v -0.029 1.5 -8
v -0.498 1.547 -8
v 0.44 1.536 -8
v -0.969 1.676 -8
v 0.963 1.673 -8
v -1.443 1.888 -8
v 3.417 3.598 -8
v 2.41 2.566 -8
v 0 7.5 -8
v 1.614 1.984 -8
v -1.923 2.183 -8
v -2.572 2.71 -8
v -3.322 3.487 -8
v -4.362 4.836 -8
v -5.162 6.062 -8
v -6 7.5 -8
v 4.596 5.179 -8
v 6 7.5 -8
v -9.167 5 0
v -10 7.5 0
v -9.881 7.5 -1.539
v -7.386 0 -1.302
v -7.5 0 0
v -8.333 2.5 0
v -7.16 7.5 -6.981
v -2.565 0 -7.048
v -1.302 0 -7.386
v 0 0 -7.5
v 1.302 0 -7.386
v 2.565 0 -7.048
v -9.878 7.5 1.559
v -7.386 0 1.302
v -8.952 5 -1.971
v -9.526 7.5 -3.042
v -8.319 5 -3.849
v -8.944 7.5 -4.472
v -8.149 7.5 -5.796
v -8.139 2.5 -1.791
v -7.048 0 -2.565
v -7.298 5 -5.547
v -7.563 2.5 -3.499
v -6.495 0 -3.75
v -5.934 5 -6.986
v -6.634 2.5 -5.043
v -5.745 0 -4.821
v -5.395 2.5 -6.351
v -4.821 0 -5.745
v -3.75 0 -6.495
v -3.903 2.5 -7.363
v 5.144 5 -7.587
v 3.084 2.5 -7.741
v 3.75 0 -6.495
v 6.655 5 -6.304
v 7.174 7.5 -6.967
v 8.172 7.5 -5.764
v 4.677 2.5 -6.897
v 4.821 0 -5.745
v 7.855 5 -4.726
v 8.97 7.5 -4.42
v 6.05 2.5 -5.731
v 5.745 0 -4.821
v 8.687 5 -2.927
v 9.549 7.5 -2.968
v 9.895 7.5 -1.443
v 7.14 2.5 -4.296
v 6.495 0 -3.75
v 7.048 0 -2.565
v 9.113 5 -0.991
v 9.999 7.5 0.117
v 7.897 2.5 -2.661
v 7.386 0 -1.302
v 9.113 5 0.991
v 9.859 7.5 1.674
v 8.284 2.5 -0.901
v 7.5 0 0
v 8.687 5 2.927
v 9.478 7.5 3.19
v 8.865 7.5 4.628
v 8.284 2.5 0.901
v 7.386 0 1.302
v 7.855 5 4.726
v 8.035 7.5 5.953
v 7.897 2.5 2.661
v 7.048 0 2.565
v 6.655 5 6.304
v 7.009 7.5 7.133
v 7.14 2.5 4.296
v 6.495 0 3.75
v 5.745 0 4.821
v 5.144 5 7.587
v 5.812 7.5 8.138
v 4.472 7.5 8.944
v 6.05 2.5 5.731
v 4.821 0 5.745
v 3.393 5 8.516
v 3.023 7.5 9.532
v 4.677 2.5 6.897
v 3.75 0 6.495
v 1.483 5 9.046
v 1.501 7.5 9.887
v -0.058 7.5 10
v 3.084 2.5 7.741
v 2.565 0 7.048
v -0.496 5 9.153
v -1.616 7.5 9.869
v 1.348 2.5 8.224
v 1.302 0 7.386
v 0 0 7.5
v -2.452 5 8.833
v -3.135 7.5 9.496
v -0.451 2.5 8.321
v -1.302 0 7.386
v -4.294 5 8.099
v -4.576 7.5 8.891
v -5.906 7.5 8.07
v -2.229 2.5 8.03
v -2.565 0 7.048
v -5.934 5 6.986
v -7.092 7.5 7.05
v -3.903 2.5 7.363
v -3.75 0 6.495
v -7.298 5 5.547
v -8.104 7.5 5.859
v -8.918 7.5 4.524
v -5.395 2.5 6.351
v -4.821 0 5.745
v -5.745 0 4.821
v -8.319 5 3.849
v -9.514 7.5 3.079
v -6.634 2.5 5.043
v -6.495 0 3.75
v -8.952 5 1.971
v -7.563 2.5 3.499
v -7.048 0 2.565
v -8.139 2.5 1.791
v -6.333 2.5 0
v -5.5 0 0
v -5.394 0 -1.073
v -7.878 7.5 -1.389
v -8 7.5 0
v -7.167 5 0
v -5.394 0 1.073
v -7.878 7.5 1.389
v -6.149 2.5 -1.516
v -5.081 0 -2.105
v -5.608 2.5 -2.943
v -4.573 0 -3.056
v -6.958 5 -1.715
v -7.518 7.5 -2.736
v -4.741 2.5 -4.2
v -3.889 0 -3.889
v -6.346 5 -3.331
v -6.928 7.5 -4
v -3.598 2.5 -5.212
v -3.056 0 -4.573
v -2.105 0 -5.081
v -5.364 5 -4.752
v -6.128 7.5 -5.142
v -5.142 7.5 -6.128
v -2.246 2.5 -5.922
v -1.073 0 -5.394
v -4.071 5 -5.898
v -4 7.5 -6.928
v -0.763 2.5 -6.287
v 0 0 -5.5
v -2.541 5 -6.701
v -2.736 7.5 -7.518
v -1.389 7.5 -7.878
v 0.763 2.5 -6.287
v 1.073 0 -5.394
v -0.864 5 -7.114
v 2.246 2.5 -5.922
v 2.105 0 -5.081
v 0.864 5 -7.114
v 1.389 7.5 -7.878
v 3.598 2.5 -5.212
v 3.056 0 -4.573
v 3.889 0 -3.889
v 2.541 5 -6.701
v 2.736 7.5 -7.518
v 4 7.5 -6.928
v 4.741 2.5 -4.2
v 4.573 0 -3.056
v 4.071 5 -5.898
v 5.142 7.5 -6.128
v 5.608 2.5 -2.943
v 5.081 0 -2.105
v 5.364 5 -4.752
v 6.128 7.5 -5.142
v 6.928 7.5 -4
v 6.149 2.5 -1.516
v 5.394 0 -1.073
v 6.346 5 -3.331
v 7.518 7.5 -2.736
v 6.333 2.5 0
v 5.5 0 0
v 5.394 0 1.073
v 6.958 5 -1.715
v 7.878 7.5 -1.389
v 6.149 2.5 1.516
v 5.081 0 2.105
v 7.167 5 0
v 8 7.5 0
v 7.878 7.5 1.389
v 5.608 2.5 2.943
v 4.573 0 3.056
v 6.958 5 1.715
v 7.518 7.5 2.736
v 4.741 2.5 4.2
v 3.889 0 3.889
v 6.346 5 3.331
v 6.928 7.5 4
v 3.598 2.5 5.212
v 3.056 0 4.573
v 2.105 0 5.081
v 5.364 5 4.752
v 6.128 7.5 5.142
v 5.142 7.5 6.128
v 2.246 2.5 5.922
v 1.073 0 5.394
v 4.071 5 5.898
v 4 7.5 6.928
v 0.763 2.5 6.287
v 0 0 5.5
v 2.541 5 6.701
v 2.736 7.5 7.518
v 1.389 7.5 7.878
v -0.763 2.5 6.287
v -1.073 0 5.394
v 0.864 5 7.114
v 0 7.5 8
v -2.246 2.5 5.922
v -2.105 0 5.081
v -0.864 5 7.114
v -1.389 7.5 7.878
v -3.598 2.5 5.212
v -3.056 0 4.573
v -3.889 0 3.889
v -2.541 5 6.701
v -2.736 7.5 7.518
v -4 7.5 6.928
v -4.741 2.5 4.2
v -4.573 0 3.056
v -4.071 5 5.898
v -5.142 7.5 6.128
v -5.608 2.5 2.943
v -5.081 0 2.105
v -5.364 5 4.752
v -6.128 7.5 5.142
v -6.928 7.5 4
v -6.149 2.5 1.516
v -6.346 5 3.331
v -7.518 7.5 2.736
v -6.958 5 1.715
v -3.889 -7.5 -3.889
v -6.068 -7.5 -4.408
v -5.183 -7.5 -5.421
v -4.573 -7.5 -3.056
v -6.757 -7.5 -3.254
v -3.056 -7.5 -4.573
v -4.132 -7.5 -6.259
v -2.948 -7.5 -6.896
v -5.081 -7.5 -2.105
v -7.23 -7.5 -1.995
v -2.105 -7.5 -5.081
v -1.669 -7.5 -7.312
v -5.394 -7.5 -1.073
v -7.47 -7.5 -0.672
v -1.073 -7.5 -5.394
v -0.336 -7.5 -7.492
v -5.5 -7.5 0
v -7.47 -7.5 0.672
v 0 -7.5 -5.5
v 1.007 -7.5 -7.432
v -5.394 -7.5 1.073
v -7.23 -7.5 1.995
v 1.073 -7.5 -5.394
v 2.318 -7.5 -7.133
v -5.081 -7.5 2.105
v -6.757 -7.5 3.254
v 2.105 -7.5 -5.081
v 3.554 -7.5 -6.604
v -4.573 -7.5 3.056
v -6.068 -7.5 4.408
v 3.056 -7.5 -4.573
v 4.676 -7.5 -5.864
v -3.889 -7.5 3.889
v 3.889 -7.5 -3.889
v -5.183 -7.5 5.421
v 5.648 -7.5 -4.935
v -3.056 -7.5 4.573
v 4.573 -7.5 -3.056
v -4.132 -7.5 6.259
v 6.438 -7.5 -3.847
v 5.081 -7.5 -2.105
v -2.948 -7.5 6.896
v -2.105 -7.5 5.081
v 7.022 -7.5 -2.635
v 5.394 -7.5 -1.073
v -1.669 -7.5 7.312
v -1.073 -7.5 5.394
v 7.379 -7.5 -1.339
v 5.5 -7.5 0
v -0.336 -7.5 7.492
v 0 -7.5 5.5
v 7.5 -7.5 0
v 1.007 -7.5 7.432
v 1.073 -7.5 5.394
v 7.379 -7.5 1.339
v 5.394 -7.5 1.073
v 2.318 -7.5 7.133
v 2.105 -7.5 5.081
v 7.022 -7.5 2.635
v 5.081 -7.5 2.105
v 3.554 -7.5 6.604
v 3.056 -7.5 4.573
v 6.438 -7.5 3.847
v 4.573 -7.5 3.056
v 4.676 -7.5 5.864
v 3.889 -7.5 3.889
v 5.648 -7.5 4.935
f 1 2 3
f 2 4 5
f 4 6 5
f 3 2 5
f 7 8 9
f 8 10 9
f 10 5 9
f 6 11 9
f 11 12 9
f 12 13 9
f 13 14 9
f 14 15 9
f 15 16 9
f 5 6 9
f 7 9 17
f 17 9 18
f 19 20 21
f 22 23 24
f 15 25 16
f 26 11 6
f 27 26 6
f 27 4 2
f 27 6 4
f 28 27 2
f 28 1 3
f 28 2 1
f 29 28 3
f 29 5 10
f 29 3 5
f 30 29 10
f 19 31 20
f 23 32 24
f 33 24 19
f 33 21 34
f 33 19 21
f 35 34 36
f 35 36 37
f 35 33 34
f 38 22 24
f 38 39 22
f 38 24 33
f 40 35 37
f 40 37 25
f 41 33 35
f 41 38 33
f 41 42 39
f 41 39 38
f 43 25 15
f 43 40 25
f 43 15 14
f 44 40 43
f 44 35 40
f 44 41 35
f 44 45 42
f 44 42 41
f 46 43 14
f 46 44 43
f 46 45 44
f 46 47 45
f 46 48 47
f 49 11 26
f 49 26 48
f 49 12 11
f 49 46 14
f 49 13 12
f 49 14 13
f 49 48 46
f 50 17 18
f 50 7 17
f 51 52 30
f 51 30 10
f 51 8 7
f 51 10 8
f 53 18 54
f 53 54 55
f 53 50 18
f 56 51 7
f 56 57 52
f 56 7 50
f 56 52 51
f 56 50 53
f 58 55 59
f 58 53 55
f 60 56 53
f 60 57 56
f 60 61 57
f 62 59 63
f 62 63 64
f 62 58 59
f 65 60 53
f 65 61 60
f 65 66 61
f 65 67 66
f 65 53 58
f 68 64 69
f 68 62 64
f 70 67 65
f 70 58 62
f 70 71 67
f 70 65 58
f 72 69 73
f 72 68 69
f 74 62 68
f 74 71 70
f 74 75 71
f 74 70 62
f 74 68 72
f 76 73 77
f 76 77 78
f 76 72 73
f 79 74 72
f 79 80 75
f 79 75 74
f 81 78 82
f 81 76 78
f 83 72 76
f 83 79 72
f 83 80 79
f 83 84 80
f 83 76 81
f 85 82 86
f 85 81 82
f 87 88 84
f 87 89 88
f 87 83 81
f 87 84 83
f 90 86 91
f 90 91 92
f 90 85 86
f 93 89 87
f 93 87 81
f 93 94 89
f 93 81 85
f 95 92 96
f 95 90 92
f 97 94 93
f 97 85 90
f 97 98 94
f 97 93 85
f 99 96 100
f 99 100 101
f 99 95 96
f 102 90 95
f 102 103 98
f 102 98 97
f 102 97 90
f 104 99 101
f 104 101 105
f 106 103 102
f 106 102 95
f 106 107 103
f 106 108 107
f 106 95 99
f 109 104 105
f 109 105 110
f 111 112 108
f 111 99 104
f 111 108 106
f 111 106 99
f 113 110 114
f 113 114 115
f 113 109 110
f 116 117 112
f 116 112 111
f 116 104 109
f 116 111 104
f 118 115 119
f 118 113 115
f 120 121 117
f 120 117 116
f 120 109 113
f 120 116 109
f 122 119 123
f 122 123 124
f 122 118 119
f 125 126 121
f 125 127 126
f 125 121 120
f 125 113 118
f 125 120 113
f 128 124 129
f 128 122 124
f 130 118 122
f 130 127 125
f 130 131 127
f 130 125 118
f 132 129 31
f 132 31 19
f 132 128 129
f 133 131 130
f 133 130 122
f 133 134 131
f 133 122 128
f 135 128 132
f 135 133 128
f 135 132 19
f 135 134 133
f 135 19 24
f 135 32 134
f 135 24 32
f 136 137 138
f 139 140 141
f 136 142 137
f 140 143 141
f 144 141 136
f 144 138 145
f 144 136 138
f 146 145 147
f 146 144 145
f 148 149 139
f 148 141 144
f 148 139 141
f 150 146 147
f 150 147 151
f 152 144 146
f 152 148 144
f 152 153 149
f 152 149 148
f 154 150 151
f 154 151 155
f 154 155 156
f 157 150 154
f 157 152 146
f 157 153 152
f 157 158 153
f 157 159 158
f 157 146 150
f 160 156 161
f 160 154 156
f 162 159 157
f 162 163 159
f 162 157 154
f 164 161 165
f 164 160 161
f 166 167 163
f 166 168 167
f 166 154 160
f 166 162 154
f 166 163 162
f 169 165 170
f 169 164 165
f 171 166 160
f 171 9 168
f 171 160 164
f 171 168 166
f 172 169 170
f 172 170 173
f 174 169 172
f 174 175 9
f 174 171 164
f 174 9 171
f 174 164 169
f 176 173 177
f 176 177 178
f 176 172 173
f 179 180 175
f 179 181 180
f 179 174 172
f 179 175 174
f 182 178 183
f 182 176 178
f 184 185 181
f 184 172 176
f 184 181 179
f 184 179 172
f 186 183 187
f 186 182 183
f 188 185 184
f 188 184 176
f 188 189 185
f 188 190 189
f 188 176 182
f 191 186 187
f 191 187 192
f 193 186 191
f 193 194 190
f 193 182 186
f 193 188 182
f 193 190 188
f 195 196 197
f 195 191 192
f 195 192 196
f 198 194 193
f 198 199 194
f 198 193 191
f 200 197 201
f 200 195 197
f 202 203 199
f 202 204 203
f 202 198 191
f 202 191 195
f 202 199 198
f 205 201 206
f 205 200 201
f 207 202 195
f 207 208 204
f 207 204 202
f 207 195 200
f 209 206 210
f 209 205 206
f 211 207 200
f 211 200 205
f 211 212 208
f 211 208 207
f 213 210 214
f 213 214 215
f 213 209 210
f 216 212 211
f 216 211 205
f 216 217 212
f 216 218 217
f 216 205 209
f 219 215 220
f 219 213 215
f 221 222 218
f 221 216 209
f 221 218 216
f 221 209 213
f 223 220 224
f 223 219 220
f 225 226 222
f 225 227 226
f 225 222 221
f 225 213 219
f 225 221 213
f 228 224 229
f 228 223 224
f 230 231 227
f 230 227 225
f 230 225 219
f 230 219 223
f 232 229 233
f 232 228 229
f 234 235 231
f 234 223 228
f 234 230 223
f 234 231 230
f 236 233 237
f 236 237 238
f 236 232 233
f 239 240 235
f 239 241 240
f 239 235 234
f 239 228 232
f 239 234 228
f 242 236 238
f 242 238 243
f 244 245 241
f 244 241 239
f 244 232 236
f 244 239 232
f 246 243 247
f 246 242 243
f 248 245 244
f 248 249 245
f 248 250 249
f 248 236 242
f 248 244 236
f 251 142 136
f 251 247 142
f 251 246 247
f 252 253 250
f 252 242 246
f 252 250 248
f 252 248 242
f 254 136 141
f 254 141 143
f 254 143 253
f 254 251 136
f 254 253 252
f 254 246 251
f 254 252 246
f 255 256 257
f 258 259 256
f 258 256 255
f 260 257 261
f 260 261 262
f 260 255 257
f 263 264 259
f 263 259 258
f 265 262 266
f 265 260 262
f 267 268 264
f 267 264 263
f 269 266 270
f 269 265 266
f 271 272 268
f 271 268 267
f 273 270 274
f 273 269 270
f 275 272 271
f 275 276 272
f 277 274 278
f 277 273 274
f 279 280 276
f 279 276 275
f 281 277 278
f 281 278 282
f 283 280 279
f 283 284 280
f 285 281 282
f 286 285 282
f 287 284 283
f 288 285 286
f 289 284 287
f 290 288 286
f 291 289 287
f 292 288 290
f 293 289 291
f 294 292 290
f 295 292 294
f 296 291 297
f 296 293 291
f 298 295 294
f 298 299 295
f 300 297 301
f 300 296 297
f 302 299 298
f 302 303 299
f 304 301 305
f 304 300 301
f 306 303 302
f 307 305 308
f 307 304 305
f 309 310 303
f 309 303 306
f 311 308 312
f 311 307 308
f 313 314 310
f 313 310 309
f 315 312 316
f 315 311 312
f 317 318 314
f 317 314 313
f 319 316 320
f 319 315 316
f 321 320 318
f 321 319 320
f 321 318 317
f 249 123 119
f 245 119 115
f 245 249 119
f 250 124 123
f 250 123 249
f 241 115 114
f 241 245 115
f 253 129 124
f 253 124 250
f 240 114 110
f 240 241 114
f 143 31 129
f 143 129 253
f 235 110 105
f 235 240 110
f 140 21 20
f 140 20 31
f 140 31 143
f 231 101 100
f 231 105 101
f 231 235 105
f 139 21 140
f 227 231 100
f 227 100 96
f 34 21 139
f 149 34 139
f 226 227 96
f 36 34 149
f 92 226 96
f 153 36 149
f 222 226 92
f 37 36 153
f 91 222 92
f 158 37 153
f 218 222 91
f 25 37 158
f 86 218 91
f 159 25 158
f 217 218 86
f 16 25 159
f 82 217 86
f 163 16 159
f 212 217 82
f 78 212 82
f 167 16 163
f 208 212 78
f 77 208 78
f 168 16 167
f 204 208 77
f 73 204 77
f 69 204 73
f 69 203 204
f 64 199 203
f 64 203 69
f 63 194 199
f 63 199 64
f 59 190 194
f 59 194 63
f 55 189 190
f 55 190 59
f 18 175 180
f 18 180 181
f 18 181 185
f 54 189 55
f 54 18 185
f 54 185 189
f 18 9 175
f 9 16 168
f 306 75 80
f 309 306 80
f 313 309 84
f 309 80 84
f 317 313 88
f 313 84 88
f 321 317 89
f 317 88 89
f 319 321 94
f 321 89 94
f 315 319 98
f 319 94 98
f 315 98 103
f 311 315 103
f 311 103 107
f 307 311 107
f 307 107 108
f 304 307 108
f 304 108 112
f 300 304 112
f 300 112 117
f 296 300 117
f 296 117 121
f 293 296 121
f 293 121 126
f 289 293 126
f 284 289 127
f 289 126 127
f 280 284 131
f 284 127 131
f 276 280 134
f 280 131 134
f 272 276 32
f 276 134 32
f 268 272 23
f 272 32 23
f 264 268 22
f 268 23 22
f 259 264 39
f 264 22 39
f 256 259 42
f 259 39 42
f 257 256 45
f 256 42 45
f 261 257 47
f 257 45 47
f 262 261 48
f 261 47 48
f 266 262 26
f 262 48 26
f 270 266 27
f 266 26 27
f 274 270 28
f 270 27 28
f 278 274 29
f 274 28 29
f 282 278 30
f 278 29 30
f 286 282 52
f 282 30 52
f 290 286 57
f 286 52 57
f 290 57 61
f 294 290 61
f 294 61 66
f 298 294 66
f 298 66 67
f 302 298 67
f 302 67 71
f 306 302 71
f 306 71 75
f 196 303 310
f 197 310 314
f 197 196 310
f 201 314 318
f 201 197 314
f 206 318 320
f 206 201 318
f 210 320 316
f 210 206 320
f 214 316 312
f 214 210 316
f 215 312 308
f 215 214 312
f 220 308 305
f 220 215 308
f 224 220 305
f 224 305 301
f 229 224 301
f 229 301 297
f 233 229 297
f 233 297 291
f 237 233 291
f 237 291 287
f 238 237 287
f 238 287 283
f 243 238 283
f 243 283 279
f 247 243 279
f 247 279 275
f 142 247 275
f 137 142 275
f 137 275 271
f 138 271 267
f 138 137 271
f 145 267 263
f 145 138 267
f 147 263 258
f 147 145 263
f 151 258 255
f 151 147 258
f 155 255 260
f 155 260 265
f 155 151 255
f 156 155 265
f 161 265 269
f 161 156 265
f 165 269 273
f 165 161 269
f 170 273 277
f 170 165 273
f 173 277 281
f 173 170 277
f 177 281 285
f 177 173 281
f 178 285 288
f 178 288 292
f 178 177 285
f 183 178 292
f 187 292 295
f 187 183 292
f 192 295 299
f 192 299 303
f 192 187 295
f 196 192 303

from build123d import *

# Parameters (mm, degrees)
CROQUIS3_R              = 7.5
CROQUIS3_R_2            = 5.5
SALIENTE_EXTRUIR1_DEPTH = 7.5
CROQUIS4_W              = 14.601596012
CROQUIS4_H              = 2.867230366
CORTAR_EXTRUIR1_DEPTH   = 19.5


with BuildPart() as part:
    # Croquis2 → Revolución1 (revolve)
    with BuildSketch(Plane.XY):
        Polygon((-5.5, 0), (-8, 7.5), (-10, 7.5), (-7.5, 0), align=None)
    revolve(axis=Axis((0, 7.5, 0), (0, -1, 0)))

    # Croquis3 → Saliente-Extruir1 (add)
    with BuildSketch(Plane.XZ):
        Circle(CROQUIS3_R)
        Circle(CROQUIS3_R_2, mode=Mode.SUBTRACT)
    extrude(amount=SALIENTE_EXTRUIR1_DEPTH)

    # Croquis4 → Cortar-Extruir1 (cut)
    with BuildSketch(Plane(origin=(0, 7.5, 0), x_dir=(1, 0, 0), z_dir=(0, 1, 0))):
        with Locations((0, 9.433615183)):
            Rectangle(CROQUIS4_W, CROQUIS4_H)
    extrude(amount=-CORTAR_EXTRUIR1_DEPTH, mode=Mode.SUBTRACT)


solid = part.part
